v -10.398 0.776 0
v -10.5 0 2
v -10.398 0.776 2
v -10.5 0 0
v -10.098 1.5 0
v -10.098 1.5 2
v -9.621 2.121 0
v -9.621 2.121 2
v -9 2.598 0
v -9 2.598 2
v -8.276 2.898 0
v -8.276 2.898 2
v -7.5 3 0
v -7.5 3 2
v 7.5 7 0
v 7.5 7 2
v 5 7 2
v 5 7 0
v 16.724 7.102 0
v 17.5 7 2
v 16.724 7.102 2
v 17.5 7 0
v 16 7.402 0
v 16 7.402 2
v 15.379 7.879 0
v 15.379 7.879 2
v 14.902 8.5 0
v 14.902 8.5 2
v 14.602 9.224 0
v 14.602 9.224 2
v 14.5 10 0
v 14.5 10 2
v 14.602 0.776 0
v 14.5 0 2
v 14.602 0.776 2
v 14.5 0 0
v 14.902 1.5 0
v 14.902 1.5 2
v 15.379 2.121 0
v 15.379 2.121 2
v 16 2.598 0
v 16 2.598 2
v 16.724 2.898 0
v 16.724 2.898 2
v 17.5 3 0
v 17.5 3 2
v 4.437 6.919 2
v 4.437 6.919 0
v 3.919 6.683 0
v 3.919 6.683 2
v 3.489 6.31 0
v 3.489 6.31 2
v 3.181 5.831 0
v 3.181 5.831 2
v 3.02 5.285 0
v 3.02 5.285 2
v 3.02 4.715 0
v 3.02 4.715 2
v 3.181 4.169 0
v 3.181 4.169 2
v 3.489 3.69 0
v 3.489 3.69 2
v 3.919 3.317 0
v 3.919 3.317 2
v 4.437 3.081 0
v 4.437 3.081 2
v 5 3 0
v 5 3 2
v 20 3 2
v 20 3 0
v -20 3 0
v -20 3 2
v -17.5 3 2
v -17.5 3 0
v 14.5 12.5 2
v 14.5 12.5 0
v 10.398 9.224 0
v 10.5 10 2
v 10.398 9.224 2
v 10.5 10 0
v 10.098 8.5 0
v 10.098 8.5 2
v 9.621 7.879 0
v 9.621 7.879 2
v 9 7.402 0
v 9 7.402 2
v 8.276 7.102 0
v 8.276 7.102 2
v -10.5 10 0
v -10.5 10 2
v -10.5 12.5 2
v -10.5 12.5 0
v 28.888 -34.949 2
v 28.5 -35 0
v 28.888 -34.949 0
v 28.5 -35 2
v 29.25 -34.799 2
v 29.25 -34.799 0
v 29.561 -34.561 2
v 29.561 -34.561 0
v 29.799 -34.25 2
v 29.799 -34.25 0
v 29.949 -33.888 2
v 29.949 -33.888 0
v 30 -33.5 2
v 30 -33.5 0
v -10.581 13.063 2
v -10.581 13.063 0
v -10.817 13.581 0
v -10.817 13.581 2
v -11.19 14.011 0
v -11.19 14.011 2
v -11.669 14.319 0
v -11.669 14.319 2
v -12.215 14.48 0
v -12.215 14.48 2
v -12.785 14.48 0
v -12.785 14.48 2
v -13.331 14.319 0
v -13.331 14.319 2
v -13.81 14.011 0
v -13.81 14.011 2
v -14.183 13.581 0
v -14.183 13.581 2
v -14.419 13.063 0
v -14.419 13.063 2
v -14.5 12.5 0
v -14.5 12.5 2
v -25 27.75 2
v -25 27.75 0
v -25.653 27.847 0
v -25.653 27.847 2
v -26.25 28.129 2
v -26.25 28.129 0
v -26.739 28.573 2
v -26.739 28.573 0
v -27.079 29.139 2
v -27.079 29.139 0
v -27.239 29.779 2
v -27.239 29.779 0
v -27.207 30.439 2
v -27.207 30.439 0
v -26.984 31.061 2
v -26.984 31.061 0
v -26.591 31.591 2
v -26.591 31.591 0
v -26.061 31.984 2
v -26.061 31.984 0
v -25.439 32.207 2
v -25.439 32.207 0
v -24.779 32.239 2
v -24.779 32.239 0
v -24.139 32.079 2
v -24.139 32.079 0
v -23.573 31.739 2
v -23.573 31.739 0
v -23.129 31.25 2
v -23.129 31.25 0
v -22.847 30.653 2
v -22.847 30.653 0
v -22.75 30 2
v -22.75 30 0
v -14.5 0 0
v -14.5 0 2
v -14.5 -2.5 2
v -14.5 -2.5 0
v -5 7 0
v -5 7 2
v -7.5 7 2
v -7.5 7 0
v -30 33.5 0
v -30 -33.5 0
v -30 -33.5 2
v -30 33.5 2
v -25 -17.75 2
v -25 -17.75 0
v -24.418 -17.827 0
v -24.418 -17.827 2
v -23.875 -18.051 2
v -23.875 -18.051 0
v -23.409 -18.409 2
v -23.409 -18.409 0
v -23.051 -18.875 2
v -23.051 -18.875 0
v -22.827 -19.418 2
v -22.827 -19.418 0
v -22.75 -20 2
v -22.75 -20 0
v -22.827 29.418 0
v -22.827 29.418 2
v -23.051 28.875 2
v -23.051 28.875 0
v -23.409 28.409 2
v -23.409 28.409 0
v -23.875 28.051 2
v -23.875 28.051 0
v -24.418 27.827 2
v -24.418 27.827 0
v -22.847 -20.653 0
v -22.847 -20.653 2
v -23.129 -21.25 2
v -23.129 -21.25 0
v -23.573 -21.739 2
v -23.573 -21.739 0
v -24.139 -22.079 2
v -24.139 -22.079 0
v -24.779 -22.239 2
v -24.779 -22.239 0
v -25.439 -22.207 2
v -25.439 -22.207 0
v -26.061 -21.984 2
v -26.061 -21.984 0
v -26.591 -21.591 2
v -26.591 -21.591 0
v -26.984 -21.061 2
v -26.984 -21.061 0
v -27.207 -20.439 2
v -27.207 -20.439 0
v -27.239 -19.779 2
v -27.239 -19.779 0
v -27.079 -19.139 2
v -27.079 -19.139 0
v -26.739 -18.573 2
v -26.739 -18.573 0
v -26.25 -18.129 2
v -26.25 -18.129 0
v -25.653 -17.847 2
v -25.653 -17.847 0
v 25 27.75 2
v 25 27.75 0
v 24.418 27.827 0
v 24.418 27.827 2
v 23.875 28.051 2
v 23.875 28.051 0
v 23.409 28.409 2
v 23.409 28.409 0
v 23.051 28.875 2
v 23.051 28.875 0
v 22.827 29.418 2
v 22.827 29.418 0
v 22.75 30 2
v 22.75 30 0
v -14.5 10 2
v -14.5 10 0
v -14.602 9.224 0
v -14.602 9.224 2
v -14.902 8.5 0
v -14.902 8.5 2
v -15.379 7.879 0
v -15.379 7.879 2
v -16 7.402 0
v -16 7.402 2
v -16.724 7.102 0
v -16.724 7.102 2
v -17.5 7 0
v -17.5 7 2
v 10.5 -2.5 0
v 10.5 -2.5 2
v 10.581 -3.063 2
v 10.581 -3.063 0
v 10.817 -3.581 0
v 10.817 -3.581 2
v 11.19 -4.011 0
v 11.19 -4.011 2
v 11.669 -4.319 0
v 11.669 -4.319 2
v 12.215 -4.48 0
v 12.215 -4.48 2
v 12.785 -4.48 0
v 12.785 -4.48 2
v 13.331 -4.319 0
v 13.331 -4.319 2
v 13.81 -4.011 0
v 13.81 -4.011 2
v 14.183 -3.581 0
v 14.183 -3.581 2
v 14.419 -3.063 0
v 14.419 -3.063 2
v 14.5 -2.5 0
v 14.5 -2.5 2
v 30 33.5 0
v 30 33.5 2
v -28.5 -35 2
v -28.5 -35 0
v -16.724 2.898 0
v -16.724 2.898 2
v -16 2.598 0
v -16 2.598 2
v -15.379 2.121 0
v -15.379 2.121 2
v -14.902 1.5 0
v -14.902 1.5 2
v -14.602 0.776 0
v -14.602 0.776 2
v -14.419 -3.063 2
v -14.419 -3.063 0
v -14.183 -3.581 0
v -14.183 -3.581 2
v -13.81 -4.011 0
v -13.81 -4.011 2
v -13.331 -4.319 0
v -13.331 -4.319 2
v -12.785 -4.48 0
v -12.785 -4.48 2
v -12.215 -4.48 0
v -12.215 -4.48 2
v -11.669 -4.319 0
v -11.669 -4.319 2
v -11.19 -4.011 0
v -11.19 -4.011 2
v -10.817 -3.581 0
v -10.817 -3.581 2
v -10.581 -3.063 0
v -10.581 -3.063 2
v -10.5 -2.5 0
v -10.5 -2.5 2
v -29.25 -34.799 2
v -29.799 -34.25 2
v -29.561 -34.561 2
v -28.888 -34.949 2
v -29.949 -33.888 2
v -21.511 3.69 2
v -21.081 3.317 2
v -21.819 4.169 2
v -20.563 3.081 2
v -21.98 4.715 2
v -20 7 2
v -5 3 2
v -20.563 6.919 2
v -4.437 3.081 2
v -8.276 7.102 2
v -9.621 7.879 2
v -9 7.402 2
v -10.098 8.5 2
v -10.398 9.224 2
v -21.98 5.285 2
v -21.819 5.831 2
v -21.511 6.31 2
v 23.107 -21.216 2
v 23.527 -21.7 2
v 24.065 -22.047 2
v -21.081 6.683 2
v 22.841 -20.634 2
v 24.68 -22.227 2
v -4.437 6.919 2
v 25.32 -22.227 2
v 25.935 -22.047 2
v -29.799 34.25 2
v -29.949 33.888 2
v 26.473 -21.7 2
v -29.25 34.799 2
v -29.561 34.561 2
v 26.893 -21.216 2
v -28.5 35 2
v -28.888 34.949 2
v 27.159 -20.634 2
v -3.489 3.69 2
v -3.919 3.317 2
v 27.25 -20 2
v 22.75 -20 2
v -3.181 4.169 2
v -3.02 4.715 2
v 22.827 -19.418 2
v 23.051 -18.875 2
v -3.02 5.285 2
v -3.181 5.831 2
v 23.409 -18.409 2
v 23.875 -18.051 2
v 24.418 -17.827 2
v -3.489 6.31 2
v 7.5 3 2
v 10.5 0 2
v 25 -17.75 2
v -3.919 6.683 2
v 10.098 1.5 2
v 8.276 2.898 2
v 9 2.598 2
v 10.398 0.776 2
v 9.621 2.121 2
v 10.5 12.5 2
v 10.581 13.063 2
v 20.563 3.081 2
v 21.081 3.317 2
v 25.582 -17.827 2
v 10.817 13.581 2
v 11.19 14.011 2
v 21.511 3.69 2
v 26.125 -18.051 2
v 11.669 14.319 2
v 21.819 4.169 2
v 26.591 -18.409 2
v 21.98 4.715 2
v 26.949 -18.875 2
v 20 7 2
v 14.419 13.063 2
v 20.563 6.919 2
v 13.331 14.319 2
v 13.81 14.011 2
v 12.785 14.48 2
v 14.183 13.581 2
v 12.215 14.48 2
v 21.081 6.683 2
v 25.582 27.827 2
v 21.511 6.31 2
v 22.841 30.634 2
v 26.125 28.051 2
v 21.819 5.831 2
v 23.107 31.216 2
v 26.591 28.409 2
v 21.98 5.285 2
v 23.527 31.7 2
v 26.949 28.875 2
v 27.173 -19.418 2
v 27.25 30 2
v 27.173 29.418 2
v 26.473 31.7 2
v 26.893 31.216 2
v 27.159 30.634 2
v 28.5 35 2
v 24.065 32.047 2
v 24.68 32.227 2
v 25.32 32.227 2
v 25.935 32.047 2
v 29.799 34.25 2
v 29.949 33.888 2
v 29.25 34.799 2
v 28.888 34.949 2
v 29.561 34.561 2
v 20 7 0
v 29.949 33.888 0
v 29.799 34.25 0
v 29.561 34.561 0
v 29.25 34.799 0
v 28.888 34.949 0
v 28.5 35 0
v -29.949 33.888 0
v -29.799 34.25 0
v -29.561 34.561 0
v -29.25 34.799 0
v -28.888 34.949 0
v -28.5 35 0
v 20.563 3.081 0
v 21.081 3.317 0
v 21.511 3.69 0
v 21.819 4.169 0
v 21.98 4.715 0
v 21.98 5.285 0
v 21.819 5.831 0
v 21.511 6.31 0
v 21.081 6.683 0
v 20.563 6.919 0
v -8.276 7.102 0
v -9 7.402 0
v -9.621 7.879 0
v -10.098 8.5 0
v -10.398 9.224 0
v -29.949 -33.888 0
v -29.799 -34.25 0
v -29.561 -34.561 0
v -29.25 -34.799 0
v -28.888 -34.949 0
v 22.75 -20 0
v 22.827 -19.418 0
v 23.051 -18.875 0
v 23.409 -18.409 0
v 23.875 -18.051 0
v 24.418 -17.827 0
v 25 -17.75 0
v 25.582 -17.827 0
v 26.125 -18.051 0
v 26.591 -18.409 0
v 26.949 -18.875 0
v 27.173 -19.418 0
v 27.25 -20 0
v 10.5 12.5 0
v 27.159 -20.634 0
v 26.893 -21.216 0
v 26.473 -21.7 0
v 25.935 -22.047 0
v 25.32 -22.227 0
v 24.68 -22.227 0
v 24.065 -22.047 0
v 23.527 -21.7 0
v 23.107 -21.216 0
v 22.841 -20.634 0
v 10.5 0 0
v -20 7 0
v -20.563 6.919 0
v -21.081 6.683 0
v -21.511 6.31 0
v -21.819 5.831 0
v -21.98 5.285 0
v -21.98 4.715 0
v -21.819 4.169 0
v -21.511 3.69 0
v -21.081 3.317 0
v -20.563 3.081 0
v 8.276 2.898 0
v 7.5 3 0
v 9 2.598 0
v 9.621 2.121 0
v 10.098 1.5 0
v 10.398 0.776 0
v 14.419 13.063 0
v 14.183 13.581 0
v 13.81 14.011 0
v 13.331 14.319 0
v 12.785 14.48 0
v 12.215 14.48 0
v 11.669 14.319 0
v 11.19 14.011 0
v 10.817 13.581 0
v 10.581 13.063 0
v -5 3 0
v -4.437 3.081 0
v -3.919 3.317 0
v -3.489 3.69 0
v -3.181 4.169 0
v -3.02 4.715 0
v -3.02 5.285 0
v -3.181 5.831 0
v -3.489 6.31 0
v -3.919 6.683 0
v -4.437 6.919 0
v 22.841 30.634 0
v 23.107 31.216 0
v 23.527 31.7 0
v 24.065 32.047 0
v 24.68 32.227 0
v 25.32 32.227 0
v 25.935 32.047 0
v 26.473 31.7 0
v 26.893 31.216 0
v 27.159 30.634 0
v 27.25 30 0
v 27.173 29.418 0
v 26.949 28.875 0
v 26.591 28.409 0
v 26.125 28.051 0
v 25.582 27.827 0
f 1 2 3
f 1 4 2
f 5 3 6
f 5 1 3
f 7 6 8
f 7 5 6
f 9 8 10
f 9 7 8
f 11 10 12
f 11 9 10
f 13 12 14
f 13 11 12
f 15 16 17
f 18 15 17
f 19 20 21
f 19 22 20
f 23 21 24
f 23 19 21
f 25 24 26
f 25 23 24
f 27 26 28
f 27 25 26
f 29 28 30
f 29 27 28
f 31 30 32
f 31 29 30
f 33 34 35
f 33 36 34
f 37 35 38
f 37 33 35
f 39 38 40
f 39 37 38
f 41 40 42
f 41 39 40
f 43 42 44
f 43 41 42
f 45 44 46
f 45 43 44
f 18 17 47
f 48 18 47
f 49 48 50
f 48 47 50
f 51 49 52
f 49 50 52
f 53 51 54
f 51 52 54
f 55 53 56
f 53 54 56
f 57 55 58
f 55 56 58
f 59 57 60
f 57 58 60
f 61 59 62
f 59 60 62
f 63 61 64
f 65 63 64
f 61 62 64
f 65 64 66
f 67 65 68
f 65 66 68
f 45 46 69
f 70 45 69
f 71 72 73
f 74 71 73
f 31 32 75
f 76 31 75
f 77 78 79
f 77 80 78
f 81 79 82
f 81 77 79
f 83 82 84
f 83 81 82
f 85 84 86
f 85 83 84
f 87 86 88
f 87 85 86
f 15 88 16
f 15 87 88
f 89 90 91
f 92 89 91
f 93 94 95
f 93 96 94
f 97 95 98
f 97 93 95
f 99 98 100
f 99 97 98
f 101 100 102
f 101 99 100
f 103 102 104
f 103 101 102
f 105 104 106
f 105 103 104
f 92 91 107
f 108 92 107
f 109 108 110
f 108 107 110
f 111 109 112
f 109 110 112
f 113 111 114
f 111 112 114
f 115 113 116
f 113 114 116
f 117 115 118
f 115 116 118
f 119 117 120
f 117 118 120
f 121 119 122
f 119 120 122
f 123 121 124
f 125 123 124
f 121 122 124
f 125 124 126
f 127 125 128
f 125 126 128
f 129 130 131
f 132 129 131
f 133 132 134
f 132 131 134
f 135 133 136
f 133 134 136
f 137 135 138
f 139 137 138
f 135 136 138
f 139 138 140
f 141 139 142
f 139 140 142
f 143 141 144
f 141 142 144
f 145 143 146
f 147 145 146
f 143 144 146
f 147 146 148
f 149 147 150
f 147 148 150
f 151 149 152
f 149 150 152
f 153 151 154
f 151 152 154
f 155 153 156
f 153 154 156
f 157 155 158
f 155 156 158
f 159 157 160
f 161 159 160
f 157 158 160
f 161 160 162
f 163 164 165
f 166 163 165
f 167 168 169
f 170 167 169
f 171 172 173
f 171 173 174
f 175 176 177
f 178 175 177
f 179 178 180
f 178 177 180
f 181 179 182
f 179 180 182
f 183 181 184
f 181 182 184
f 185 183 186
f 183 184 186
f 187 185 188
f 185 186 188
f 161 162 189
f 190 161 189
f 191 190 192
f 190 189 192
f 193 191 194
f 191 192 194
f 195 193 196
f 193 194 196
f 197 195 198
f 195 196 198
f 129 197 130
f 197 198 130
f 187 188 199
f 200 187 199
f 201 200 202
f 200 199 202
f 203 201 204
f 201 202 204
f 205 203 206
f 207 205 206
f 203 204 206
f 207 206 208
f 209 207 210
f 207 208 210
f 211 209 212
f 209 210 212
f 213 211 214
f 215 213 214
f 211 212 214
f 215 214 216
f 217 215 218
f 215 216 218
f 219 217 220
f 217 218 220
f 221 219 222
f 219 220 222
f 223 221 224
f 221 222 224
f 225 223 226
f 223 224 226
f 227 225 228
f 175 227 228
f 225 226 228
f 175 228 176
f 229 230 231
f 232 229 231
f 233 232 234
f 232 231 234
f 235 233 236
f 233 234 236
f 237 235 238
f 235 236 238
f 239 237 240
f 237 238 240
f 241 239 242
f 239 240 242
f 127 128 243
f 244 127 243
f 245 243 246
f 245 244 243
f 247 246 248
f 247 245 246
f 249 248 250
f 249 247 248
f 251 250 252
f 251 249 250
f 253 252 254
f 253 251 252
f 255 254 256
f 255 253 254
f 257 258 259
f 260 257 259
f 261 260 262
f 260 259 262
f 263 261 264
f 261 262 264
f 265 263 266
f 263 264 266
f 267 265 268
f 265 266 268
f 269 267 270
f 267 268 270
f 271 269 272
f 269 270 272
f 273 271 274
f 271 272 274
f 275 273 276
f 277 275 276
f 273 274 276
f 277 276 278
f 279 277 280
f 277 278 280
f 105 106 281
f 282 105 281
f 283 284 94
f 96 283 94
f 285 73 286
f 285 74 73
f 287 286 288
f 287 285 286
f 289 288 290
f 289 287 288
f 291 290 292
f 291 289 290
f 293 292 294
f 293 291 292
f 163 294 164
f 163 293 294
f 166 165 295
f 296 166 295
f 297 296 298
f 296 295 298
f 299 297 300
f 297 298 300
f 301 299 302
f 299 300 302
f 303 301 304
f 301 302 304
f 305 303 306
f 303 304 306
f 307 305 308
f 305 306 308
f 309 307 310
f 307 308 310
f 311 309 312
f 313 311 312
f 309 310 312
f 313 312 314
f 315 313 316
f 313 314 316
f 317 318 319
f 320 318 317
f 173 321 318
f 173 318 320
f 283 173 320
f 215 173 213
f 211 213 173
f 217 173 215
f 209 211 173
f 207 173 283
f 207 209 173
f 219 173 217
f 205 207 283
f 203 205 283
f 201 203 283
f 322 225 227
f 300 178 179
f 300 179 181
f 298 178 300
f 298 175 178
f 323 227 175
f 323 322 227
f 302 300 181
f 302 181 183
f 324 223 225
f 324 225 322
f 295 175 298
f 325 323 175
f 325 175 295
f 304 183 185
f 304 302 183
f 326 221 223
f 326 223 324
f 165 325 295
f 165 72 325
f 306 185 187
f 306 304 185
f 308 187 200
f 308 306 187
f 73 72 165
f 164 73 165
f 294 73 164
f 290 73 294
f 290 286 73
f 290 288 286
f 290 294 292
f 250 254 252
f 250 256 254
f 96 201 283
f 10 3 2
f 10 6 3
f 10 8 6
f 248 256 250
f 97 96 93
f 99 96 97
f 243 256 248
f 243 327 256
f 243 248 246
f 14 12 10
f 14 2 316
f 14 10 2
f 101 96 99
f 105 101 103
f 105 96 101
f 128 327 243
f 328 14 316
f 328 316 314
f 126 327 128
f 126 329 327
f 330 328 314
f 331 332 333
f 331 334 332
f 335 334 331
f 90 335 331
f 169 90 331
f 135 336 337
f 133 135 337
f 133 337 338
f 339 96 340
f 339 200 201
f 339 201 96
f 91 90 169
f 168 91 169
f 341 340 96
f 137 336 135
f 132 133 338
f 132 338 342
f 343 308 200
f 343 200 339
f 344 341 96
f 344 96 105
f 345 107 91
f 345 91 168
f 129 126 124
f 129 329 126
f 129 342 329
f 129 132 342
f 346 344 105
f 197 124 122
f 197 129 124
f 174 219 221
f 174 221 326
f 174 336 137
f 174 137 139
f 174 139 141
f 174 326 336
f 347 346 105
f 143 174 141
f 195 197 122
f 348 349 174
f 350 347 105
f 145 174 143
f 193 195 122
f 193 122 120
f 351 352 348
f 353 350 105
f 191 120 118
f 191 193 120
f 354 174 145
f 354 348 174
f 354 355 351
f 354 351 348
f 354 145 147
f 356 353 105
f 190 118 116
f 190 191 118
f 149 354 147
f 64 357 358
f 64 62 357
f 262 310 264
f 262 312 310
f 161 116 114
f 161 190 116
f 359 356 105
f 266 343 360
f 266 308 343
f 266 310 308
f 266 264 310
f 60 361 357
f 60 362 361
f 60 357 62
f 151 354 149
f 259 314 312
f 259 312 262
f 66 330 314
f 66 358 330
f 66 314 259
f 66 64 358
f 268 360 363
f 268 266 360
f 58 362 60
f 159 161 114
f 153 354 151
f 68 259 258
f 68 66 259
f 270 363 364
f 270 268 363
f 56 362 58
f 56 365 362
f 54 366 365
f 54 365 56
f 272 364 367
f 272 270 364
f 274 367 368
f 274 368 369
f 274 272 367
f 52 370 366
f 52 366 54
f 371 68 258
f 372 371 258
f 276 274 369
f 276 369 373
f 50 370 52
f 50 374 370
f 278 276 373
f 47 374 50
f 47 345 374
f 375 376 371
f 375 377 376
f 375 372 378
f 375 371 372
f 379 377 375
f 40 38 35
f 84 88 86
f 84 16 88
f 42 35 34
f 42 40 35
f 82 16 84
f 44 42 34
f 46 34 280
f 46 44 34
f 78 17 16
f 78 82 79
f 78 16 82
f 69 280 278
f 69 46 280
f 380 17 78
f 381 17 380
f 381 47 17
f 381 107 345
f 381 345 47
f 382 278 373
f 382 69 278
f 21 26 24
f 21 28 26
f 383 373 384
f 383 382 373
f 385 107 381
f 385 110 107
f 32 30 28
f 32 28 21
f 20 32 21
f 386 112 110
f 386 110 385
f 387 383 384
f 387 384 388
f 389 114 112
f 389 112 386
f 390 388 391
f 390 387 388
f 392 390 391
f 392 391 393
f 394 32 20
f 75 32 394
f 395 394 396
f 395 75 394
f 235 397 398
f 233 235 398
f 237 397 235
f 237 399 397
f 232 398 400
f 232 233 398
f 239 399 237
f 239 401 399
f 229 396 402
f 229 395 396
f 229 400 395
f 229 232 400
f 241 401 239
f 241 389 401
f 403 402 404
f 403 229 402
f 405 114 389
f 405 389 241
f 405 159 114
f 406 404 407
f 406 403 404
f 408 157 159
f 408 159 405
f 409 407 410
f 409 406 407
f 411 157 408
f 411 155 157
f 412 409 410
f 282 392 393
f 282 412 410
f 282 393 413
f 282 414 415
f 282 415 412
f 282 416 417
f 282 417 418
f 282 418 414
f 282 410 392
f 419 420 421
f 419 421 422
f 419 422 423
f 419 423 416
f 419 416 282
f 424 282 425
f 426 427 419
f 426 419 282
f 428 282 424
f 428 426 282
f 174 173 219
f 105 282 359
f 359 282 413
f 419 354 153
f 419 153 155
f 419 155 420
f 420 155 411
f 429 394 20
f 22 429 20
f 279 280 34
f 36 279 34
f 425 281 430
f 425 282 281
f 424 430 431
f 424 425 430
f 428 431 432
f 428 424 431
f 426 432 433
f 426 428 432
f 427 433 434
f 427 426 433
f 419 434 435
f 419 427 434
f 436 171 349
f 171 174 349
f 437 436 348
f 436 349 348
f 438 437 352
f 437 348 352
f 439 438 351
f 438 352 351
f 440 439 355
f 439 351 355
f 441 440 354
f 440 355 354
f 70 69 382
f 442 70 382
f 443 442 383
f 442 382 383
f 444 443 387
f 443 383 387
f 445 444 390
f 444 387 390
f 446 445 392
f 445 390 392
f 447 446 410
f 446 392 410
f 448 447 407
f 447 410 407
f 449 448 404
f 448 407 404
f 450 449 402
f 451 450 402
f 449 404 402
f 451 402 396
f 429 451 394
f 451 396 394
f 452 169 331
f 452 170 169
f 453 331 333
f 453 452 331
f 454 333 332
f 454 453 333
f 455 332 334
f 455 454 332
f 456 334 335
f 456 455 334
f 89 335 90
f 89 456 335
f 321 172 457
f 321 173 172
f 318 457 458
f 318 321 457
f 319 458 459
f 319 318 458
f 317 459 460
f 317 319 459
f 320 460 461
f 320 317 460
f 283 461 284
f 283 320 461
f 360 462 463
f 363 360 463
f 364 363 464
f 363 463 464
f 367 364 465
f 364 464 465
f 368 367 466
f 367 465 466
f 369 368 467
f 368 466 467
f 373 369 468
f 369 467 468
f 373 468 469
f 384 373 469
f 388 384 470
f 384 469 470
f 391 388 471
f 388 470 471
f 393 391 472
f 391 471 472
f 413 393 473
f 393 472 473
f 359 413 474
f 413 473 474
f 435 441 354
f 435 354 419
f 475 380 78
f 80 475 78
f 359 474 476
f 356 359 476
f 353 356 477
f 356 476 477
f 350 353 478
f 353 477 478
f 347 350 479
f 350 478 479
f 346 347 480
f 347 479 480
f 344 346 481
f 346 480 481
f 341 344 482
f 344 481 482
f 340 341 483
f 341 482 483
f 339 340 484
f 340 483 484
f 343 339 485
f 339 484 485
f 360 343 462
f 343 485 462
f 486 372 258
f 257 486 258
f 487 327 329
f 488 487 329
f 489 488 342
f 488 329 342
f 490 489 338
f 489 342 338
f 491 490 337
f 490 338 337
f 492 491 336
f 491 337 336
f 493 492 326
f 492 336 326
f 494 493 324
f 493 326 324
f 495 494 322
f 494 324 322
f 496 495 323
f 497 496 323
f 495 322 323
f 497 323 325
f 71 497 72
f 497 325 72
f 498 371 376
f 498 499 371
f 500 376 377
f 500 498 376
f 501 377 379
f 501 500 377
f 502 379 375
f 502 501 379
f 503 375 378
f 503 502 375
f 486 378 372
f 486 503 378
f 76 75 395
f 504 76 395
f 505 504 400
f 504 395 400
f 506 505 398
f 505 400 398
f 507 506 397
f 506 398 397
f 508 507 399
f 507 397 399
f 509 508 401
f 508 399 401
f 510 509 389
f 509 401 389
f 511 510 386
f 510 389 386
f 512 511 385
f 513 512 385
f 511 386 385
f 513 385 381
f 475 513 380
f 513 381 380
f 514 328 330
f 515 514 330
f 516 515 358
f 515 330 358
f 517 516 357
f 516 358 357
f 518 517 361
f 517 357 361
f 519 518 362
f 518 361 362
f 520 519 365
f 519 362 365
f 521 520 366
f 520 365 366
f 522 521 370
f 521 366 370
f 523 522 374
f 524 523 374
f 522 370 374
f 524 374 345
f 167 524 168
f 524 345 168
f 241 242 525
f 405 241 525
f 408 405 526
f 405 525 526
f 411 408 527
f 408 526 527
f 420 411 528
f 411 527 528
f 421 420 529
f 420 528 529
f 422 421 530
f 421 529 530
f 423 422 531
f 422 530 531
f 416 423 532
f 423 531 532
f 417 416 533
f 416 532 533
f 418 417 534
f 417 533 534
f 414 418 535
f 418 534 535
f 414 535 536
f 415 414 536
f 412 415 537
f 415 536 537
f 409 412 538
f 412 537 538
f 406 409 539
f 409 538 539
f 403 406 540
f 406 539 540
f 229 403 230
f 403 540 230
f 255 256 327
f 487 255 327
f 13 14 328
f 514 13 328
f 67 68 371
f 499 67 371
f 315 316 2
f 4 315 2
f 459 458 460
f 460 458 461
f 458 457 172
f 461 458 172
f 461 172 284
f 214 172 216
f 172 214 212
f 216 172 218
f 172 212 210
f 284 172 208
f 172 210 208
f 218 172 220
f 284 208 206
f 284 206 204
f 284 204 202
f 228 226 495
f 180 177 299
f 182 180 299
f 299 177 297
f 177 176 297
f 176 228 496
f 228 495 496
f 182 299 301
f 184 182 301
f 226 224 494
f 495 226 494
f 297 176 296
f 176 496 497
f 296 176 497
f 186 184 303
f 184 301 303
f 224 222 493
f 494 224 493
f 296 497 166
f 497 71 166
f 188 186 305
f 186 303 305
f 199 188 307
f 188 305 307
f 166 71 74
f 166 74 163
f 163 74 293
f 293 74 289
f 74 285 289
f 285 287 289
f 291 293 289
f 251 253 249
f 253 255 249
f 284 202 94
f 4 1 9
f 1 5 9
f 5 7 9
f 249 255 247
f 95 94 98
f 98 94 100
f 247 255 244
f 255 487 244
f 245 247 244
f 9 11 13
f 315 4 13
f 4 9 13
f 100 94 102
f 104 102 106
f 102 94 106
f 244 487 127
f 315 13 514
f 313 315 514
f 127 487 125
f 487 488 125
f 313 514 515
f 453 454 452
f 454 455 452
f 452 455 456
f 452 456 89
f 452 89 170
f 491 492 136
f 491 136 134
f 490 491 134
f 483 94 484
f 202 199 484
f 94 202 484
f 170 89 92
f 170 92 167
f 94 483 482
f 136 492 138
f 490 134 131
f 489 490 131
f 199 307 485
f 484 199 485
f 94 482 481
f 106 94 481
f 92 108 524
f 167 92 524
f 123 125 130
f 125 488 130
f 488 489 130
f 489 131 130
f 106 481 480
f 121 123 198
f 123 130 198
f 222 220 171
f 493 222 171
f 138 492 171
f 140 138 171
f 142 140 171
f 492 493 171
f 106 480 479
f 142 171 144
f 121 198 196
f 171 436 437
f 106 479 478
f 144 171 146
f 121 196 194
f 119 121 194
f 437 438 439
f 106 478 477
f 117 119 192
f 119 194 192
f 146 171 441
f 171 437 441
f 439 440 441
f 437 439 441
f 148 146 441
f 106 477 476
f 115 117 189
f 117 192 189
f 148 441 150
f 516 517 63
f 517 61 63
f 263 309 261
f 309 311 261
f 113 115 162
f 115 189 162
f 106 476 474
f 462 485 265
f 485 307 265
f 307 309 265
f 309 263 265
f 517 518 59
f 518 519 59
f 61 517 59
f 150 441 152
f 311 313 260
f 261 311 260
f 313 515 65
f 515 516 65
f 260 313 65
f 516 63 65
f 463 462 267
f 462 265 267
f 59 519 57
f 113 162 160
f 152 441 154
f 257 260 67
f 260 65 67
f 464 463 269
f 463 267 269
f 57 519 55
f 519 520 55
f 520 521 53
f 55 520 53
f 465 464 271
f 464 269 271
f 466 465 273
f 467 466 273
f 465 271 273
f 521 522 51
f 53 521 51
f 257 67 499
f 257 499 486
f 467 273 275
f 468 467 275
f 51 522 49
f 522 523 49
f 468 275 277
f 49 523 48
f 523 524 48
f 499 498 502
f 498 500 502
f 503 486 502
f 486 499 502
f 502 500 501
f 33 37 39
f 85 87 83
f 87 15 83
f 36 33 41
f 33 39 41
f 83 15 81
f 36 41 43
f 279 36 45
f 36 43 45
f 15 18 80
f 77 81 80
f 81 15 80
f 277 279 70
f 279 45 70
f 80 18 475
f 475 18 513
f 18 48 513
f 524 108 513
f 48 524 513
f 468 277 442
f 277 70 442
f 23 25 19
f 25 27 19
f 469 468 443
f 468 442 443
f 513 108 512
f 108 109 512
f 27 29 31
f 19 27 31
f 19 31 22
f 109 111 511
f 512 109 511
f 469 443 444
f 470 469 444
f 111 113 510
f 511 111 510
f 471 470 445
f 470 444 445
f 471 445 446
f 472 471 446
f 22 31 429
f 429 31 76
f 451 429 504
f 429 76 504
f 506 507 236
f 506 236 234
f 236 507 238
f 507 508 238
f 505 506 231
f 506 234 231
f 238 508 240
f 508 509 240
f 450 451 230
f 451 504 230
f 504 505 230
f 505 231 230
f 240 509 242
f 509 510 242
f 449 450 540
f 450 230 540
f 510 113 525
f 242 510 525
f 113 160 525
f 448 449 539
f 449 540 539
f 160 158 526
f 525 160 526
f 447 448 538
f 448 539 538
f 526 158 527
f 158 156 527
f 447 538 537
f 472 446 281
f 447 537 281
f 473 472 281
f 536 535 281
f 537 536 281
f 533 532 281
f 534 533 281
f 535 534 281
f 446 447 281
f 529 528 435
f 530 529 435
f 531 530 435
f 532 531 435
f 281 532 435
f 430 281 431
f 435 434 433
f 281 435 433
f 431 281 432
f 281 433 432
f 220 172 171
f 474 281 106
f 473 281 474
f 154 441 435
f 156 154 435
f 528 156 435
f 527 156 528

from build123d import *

# Parameters (mm, degrees)
F0_W     = 60
F0_H     = 70
F1_DEPTH = 2
F2_R     = 1.5
F3_W     = 2
F3_H     = 2
F4_DEPTH = 2
F5_R     = 3


with BuildPart() as f1:
    # F0 (on Top) → F1 (new body)
    with BuildSketch(Plane.XY):
        Rectangle(F0_W, F0_H)
        with BuildLine():
            ThreePointArc((-25, 27.75), (-26.5909902577, 31.5909902577), (-22.75, 30))
            Line((-22.75, 30), (22.75, 30))
            ThreePointArc((22.75, 30), (25, 32.25), (27.25, 30))
            ThreePointArc((27.25, 30), (26.5909902577, 28.4090097423), (25, 27.75))
            Line((25, 27.75), (25, -17.75))
            ThreePointArc((25, -17.75), (26.5909902577, -18.4090097423), (27.25, -20))
            ThreePointArc((27.25, -20), (25, -22.25), (22.75, -20))
            Line((22.75, -20), (-22.75, -20))
            ThreePointArc((-22.75, -20), (-26.5909902577, -21.5909902577), (-25, -17.75))
            Line((-25, -17.75), (-25, 27.75))
        make_face(mode=Mode.SUBTRACT)
        with BuildLine():
            Line((22.75, 30), (-22.75, 30))
            ThreePointArc((-22.75, 30), (-23.4090097423, 28.4090097423), (-25, 27.75))
            Line((-25, 27.75), (-25, -17.75))
            ThreePointArc((-25, -17.75), (-23.4090097423, -18.4090097423), (-22.75, -20))
            Line((-22.75, -20), (22.75, -20))
            ThreePointArc((22.75, -20), (23.4090097423, -18.4090097423), (25, -17.75))
            Line((25, -17.75), (25, 27.75))
            ThreePointArc((25, 27.75), (23.4090097423, 28.4090097423), (22.75, 30))
        make_face()
    extrude(amount=F1_DEPTH)

    # F2
    f2_edges = [f1.edges().sort_by_distance(p)[0] for p in [
        (-30, 35, 1),
        (30, 35, 1),
        (-30, -35, 1),
        (30, -35, 1),
    ]]
    fillet(f2_edges, radius=F2_R)

    # F3 (on face) → F4 (cut)
    with BuildSketch(Plane.XY.offset(2)):
        with Locations((-11.5, 6)):
            Rectangle(F3_W, F3_H)
        with Locations((-13.5, 6)):
            Rectangle(F3_W, F3_H)
        with BuildLine():
            Line((-14.5, 7), (-12.5, 7))
            Line((-12.5, 7), (-10.5, 7))
            Line((-10.5, 7), (-10.5, 12.5))
            ThreePointArc((-10.5, 12.5), (-12.5, 14.5), (-14.5, 12.5))
            Line((-14.5, 12.5), (-14.5, 7))
        make_face()
        with Locations((-11.5, 4)):
            Rectangle(F3_W, F3_H)
        with Locations((-13.5, 4)):
            Rectangle(F3_W, F3_H)
        with BuildLine():
            Line((-14.5, 5), (-14.5, 7))
            Line((-14.5, 7), (-20, 7))
            ThreePointArc((-20, 7), (-22, 5), (-20, 3))
            Line((-20, 3), (-14.5, 3))
            Line((-14.5, 3), (-14.5, 5))
        make_face()
        with BuildLine():
            Line((-5, 7), (-10.5, 7))
            Line((-10.5, 7), (-10.5, 5))
            Line((-10.5, 5), (-10.5, 3))
            Line((-10.5, 3), (-5, 3))
            ThreePointArc((-5, 3), (-3, 5), (-5, 7))
        make_face()
        with BuildLine():
            Line((-10.5, 3), (-12.5, 3))
            Line((-12.5, 3), (-14.5, 3))
            Line((-14.5, 3), (-14.5, -2.5))
            ThreePointArc((-14.5, -2.5), (-12.5, -4.5), (-10.5, -2.5))
            Line((-10.5, -2.5), (-10.5, 3))
        make_face()
        with BuildLine():
            ThreePointArc((5, 7), (3, 5), (5, 3))
            Line((5, 3), (10.5, 3))
            Line((10.5, 3), (10.5, 5))
            Line((10.5, 5), (10.5, 7))
            Line((10.5, 7), (5, 7))
        make_face()
        with Locations((11.5, 4)):
            Rectangle(F3_W, F3_H)
        with BuildLine():
            Line((12.5, 3), (10.5, 3))
            Line((10.5, 3), (10.5, -2.5))
            ThreePointArc((10.5, -2.5), (12.5, -4.5), (14.5, -2.5))
            Line((14.5, -2.5), (14.5, 3))
            Line((14.5, 3), (12.5, 3))
        make_face()
        with Locations((13.5, 4)):
            Rectangle(F3_W, F3_H)
        with Locations((11.5, 6)):
            Rectangle(F3_W, F3_H)
        with BuildLine():
            Line((10.5, 12.5), (10.5, 7))
            Line((10.5, 7), (12.5, 7))
            Line((12.5, 7), (14.5, 7))
            Line((14.5, 7), (14.5, 12.5))
            ThreePointArc((14.5, 12.5), (12.5, 14.5), (10.5, 12.5))
        make_face()
        with BuildLine():
            Line((14.5, 5), (14.5, 3))
            Line((14.5, 3), (20, 3))
            ThreePointArc((20, 3), (22, 5), (20, 7))
            Line((20, 7), (14.5, 7))
            Line((14.5, 7), (14.5, 5))
        make_face()
        with Locations((13.5, 6)):
            Rectangle(F3_W, F3_H)
    extrude(amount=-F4_DEPTH, mode=Mode.SUBTRACT)

    # F5
    f5_edges = [f1.edges().sort_by_distance(p)[0] for p in [
        (-14.5, 3, 1),
        (-10.5, 3, 1),
        (-14.5, 7, 1),
        (-10.5, 7, 1),
        (10.5, 3, 1),
        (10.5, 7, 1),
        (14.5, 3, 1),
        (14.5, 7, 1),
    ]]
    fillet(f5_edges, radius=F5_R)


solid = f1.part
